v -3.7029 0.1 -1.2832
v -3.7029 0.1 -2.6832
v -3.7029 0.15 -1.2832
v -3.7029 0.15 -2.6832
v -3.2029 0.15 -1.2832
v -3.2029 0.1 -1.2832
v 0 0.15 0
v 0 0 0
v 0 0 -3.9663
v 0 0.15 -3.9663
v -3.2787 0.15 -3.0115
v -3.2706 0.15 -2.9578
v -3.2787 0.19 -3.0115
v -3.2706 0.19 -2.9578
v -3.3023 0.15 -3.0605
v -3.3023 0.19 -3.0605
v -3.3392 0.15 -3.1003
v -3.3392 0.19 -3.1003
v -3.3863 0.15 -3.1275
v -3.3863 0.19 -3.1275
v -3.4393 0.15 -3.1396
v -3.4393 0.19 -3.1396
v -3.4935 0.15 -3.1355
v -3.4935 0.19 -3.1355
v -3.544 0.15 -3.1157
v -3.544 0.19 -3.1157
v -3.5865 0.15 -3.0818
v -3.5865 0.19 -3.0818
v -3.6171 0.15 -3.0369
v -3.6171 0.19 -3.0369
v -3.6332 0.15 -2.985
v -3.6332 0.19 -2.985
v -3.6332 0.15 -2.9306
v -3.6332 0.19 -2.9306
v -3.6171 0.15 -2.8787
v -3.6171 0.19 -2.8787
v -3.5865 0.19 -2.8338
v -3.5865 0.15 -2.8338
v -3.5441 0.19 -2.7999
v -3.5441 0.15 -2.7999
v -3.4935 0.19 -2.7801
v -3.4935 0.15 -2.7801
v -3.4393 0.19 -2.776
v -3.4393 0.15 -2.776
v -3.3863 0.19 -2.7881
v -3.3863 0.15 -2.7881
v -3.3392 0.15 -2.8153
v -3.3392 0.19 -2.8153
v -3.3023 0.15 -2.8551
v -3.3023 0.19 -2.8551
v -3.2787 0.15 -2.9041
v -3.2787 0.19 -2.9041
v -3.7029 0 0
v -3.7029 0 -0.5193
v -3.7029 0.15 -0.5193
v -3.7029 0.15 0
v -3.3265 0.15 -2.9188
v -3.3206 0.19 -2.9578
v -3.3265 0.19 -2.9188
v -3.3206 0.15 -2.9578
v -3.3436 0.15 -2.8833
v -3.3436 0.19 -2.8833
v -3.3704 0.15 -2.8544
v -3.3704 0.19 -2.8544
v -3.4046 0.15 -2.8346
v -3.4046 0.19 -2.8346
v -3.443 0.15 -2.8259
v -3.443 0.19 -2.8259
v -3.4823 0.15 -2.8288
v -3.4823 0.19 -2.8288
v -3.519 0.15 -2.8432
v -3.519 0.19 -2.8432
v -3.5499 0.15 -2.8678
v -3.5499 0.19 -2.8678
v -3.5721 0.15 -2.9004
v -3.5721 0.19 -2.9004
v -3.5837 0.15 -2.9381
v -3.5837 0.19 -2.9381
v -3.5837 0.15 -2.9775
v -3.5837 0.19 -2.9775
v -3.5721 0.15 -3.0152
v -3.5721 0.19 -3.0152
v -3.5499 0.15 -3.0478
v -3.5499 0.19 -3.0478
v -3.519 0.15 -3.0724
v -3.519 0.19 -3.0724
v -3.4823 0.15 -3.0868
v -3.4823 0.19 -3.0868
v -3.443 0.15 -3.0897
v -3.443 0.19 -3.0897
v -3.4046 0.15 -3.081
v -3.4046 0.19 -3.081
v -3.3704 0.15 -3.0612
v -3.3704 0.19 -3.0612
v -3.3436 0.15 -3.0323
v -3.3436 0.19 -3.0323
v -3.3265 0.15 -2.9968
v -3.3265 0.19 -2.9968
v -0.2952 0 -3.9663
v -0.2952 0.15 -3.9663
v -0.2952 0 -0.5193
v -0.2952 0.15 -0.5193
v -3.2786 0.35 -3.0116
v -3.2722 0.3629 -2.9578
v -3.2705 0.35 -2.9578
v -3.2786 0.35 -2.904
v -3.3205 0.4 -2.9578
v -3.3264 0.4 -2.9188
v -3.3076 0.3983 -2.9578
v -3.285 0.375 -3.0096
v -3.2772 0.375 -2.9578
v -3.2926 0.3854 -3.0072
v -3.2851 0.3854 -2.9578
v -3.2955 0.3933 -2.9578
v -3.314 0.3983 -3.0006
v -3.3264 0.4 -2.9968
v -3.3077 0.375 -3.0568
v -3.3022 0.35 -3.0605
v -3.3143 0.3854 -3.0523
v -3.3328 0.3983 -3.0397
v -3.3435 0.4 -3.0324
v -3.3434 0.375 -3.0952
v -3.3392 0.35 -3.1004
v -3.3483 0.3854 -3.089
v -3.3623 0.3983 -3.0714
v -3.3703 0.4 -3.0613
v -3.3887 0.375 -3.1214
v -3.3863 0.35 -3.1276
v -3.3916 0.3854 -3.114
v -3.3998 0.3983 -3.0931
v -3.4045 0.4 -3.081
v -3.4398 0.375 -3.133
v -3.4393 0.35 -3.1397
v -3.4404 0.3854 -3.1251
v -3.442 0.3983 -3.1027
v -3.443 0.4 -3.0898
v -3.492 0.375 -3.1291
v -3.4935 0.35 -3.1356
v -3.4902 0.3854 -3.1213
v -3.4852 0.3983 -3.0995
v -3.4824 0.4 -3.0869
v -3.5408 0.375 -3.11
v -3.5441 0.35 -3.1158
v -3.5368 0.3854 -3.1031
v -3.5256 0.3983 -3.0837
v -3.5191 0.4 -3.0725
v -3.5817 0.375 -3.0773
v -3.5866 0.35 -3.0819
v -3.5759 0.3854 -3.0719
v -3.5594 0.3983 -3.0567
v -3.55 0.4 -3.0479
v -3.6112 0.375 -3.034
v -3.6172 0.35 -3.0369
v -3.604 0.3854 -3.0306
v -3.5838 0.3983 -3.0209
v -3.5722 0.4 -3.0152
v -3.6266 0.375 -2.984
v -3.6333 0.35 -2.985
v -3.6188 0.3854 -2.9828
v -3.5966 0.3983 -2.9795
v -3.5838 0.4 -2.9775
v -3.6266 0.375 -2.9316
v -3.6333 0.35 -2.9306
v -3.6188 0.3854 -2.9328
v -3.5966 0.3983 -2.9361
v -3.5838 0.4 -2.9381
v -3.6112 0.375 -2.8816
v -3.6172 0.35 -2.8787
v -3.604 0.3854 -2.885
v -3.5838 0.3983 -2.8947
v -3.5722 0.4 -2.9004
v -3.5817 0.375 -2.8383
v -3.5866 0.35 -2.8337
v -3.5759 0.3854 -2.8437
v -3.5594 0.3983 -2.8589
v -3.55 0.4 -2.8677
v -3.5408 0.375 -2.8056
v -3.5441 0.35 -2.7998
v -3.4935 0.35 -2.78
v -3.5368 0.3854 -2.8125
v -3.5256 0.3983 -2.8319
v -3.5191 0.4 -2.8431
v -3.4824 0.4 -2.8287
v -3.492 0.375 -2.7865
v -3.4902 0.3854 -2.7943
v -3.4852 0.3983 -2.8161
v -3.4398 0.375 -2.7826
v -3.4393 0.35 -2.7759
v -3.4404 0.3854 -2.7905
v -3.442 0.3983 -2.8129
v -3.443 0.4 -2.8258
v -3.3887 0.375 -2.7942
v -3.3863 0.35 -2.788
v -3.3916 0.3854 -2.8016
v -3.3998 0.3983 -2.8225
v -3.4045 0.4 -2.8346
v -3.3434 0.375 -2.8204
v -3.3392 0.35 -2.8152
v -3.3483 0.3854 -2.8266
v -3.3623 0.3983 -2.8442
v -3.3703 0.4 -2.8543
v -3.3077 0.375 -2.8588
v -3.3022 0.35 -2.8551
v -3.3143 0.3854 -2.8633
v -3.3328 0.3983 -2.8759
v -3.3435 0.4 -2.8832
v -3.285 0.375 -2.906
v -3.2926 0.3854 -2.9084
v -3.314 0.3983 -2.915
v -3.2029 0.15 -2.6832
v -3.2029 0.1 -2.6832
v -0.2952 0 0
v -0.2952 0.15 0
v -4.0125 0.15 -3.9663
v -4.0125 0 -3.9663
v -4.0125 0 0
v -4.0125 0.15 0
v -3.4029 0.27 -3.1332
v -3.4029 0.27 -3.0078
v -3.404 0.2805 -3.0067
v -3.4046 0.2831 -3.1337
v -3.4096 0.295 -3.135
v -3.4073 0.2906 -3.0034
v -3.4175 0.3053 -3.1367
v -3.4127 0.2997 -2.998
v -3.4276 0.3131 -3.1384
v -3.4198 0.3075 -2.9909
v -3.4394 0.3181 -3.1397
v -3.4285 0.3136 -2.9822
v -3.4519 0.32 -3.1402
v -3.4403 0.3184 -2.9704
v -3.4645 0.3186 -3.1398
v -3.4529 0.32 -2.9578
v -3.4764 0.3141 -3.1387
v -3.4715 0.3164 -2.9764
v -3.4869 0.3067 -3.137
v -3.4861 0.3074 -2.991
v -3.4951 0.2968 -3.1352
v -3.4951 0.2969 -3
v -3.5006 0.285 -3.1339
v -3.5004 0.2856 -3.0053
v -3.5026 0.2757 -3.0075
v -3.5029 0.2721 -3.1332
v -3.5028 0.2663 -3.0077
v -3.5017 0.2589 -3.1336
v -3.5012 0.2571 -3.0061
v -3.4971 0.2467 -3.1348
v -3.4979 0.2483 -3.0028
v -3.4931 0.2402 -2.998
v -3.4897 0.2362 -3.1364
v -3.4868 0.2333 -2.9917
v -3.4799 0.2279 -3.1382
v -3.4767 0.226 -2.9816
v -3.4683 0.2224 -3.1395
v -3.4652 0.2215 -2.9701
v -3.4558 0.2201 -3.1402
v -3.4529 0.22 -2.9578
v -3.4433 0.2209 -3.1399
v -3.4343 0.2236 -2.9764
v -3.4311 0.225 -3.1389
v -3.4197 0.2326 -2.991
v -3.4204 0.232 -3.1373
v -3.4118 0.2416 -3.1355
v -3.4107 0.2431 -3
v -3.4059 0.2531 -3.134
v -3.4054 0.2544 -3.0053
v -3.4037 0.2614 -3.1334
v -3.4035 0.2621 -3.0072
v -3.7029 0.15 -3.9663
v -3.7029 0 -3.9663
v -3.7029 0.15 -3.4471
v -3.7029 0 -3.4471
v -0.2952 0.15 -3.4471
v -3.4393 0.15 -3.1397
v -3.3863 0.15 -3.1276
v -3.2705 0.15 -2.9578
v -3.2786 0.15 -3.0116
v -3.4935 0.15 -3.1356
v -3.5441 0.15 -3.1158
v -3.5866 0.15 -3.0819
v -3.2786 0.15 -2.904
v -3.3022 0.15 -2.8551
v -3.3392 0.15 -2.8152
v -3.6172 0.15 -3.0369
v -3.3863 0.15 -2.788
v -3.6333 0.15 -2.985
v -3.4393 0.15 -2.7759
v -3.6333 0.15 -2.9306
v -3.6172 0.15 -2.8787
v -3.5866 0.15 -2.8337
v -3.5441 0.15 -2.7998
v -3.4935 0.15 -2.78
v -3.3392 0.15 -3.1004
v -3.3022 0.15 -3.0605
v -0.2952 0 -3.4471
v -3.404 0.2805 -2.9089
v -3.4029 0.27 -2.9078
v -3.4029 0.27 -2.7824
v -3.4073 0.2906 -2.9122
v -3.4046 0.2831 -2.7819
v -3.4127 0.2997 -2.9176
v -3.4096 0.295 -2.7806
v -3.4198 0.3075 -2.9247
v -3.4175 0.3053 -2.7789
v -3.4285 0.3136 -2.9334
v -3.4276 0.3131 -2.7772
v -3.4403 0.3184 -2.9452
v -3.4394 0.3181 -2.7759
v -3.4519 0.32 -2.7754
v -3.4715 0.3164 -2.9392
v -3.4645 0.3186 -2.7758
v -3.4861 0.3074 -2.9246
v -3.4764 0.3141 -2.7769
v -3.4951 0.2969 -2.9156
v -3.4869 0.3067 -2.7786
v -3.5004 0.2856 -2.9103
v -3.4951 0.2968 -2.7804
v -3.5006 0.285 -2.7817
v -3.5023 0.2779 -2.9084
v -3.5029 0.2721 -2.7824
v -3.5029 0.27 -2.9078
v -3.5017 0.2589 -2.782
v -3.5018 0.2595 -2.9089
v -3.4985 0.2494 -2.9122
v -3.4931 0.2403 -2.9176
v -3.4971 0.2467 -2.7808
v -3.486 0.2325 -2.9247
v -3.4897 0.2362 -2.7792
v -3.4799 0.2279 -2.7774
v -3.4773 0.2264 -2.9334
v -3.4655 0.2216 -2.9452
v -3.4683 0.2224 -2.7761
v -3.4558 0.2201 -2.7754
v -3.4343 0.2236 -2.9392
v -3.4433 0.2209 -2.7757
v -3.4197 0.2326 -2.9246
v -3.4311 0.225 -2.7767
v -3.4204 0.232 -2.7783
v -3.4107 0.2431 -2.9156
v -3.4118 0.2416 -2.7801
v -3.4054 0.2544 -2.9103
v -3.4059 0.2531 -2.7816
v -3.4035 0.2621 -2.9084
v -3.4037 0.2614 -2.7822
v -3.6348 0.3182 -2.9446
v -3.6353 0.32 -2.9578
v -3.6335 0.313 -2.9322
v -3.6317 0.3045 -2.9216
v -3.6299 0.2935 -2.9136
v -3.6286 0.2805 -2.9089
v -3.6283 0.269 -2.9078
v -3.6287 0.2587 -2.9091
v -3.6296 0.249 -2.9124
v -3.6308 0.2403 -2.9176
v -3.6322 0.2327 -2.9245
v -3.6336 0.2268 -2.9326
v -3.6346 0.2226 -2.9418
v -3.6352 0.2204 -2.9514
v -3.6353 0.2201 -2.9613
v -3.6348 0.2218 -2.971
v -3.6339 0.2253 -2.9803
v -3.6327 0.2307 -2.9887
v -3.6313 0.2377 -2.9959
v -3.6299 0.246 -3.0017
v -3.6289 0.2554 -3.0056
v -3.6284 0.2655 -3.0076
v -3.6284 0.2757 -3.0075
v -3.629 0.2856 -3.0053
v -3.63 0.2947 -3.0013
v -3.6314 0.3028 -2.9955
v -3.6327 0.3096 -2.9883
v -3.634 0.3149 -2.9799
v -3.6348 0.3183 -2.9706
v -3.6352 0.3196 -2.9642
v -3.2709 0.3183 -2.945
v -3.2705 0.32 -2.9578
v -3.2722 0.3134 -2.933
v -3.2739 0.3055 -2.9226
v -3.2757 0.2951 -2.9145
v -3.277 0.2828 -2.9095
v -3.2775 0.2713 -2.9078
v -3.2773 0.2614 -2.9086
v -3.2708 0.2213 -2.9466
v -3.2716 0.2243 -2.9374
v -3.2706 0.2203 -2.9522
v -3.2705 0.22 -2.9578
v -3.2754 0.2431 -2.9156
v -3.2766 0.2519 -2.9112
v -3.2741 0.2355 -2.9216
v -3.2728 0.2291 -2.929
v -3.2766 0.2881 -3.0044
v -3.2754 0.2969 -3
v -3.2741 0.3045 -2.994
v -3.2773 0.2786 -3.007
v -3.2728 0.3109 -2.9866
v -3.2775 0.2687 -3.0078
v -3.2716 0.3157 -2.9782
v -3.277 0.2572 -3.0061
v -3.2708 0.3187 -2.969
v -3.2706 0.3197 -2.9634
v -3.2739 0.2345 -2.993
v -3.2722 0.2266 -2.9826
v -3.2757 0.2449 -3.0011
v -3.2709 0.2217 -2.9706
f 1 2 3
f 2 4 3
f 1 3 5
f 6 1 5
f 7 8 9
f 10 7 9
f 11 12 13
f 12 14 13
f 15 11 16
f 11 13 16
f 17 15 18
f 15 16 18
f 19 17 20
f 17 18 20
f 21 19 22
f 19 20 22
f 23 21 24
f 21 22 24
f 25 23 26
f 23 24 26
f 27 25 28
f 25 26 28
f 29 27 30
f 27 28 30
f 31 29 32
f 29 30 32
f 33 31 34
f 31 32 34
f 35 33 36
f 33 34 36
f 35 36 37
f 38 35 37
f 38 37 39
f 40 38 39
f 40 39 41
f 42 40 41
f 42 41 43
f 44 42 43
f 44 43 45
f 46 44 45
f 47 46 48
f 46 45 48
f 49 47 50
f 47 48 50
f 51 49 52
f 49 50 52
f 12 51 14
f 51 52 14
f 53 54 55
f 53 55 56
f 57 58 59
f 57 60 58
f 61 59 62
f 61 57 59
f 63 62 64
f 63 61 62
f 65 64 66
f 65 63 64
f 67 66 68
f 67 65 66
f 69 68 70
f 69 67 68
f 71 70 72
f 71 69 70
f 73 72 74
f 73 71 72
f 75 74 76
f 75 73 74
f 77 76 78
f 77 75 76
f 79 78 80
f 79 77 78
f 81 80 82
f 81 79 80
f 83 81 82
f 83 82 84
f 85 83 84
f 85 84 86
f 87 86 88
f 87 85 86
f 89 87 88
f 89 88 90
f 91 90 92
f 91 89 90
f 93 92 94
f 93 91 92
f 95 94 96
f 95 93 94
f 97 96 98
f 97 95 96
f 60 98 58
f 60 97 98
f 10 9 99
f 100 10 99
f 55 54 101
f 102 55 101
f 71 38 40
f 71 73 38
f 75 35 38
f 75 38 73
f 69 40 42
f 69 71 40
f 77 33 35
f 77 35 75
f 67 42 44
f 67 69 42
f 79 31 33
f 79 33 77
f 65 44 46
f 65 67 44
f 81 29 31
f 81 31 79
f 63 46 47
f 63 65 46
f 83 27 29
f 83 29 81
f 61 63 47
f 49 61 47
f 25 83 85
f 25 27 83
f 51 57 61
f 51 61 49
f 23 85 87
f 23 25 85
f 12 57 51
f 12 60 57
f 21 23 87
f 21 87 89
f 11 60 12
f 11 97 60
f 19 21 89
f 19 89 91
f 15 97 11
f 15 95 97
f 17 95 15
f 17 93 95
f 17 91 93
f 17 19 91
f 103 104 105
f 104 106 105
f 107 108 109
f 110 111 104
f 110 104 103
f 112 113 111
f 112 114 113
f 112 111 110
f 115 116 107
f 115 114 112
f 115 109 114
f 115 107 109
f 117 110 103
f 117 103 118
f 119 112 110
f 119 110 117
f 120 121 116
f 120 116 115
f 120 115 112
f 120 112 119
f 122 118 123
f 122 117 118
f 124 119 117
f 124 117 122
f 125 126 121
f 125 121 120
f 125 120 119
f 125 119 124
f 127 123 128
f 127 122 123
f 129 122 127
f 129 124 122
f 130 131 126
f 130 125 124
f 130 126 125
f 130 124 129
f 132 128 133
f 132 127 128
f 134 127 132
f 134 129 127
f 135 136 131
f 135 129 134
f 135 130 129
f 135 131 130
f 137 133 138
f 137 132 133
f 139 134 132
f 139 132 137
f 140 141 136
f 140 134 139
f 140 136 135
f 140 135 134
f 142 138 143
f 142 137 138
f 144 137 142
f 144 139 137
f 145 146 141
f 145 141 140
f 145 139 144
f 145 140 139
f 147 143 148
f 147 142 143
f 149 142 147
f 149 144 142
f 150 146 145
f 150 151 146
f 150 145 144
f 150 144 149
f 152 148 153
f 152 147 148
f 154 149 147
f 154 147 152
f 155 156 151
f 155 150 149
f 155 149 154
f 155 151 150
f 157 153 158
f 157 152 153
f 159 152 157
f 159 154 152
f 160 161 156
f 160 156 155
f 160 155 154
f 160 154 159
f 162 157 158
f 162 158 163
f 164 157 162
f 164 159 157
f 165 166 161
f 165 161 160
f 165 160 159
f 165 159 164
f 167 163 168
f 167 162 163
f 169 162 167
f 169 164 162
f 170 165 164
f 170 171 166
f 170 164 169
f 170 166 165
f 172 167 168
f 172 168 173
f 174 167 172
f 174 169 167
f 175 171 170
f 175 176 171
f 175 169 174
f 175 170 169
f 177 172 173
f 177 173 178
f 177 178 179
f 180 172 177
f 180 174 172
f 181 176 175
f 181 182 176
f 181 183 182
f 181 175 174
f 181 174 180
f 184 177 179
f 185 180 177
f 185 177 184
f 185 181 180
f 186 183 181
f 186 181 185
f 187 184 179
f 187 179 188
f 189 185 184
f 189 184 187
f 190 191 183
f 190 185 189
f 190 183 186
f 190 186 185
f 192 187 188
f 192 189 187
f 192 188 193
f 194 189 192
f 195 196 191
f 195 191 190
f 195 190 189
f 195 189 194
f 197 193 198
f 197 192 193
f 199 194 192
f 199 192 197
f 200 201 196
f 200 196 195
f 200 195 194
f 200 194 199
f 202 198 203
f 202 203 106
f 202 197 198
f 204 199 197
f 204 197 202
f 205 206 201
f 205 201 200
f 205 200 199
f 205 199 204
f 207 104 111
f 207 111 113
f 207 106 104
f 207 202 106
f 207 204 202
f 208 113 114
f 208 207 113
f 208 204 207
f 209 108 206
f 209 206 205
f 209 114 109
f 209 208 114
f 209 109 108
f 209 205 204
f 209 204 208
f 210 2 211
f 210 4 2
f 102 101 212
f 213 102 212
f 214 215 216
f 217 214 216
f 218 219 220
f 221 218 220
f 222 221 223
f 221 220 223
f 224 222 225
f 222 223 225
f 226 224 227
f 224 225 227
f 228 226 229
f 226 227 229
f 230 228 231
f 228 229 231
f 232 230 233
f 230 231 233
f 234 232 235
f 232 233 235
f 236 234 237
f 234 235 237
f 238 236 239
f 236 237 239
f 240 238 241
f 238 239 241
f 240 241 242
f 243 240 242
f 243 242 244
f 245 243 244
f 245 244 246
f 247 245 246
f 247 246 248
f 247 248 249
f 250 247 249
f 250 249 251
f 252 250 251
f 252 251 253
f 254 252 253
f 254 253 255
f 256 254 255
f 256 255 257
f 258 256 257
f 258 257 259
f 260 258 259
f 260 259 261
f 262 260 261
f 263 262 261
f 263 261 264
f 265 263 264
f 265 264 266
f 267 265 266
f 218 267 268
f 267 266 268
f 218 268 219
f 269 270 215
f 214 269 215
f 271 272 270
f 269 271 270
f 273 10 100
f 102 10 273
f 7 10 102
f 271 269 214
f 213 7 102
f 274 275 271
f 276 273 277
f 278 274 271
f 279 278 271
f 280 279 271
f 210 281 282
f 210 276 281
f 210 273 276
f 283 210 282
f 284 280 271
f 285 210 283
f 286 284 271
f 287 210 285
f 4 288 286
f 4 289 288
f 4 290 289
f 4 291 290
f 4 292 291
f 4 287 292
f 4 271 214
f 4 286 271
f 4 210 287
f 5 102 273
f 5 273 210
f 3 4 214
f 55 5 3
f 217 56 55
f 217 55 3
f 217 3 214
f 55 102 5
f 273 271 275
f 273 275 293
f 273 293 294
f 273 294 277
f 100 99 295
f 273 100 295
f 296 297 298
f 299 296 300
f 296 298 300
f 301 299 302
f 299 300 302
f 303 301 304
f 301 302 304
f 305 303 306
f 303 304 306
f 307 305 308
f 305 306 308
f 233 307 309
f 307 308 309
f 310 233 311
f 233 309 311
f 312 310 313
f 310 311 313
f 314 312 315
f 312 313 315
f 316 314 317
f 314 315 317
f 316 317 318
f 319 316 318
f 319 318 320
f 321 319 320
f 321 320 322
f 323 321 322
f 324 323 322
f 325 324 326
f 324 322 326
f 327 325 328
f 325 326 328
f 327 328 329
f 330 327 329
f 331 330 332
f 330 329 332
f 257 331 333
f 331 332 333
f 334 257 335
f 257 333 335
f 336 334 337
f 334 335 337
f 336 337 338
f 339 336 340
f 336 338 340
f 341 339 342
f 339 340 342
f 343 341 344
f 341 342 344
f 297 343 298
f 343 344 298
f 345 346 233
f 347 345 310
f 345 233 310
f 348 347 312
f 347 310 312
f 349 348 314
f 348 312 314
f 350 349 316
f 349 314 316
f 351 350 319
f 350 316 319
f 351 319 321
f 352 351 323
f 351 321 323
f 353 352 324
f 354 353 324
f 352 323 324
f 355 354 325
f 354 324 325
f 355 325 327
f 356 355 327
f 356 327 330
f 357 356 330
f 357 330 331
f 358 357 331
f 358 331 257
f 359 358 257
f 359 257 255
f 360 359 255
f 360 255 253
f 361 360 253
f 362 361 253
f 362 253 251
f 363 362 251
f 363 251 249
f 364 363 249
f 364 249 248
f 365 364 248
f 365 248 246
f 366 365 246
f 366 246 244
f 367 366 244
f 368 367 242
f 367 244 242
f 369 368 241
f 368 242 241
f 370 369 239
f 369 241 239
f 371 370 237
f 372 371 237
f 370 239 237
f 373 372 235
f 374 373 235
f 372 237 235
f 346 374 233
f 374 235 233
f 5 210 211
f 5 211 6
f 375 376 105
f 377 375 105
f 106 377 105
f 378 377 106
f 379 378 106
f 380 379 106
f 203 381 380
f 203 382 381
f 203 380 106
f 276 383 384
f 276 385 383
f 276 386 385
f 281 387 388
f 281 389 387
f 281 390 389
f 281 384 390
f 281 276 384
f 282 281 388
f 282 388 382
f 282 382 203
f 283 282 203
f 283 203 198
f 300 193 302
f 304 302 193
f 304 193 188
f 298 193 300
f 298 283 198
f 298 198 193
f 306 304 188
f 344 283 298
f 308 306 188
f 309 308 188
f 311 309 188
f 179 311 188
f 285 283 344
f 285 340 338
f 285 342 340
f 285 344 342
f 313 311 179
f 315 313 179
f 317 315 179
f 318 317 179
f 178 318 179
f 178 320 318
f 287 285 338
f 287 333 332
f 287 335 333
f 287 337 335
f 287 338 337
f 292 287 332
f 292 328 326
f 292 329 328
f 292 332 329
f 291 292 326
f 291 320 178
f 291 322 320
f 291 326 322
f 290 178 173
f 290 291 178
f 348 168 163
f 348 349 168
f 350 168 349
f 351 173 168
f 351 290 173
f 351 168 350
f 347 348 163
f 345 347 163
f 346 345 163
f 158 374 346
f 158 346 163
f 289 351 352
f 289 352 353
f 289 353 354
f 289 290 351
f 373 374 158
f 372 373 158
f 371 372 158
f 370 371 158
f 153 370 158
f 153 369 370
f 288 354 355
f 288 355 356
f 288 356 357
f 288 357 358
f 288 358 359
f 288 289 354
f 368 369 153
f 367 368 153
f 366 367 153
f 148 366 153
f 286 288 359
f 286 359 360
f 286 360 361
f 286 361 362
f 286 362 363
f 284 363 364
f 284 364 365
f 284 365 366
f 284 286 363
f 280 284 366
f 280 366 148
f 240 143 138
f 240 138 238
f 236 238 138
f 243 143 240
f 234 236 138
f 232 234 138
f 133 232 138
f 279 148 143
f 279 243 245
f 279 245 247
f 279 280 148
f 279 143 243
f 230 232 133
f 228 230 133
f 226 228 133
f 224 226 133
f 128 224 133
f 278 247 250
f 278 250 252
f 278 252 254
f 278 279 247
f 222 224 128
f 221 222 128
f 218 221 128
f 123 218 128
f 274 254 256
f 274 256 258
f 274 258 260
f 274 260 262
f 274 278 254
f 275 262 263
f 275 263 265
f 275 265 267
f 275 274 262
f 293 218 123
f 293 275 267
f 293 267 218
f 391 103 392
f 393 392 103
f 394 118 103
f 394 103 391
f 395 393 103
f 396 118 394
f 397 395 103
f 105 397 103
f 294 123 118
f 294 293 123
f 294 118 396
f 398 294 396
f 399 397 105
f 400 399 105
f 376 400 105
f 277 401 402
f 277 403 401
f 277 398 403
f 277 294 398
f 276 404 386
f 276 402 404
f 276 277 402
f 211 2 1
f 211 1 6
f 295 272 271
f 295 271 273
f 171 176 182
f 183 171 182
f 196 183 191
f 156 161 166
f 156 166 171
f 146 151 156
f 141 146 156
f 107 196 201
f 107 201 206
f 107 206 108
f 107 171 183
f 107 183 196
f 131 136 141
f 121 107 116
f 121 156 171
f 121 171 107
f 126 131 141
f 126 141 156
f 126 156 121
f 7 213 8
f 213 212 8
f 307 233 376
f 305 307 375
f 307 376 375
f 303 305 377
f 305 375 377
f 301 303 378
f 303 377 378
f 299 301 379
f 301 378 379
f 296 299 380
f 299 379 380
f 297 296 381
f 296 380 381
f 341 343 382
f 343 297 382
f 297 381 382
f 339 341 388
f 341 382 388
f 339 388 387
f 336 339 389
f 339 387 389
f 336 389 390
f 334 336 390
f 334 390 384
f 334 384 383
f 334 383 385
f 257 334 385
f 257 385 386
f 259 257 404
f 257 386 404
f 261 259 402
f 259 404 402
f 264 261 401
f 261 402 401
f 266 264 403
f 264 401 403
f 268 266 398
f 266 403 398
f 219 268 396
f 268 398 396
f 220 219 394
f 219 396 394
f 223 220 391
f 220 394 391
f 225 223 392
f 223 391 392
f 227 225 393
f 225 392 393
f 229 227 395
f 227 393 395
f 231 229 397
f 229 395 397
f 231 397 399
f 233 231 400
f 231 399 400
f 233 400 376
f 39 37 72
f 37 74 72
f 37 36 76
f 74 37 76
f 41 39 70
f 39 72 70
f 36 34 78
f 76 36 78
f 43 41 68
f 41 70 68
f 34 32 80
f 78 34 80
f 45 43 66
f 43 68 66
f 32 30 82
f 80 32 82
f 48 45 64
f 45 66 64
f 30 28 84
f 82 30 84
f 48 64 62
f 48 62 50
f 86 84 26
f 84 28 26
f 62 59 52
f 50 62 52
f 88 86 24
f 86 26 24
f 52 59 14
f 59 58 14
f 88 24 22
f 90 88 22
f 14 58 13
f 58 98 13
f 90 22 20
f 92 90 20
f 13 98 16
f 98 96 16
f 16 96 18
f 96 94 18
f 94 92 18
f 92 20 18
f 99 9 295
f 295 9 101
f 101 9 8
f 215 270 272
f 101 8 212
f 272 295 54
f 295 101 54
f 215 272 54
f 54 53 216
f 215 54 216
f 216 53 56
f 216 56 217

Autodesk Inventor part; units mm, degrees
ref_plane "YZ Plane" through (0, 0, 0) normal (1, 0, 0) x (0, 1, 0)
ref_plane "XZ Plane" through (0, 0, 0) normal (0, 1, 0) x (-1, 0, 0)
sketch "Boceto1" plane through (0, 0, 0) normal (0, 1, 0) x (-1, 0, 0)
  line L0 (3.7029, -0.5193) -> (0.2952, -0.5193)
  line L1 (3.7029, -3.4471) -> (0.2952, -3.4471)
  line L2 (3.7029, -0.5193) -> (3.7029, 0)
  line L3 (3.7029, 0) -> (5.1802, 0)
  line L4 (3.7029, -3.4471) -> (3.7029, -3.9663)
  line L5 (3.7029, -3.9663) -> (5.1802, -3.9663)
  line L6 (4.0125, -3.9663) -> (4.0125, 0)
  line L7 (5.1802, -3.9663) -> (5.1802, 0)
  line L8 (0.2952, -0.5193) -> (0.2952, 0)
  line L9 (0.2952, 0) -> (0, 0)
  line L10 (0, 0) -> (-1.1677, 0)
  line L11 (-1.1677, 0) -> (-1.1677, -3.9663)
  line L12 (-1.1677, -3.9663) -> (0, -3.9663)
  line L13 (0, -3.9663) -> (0.2952, -3.9663)
  line L14 (0.2952, -3.9663) -> (0.2952, -3.4471)
  line L15 (0, 0) -> (0, -3.9663)
  line L16 (3.7029, -2.6832) -> (3.7029, -1.2832)
  line L17 (3.7029, -2.6832) -> (3.2029, -2.6832)
  line L18 (3.2029, -2.6832) -> (3.2029, -1.2832)
  line L19 (3.7029, -1.2832) -> (3.2029, -1.2832)
  line L20 (3.3553, -1.6053) -> (3.5807, -1.6053)
  line L21 (3.5807, -1.6053) -> (3.5807, -2.361)
  line L22 (3.5807, -2.361) -> (3.3553, -2.361)
  line L23 (3.3553, -2.361) -> (3.3553, -1.6053)
  circle A0 centre (3.4529, -2.9578) radius 0.1824
  line L24 (0.2952, -3.9663) -> (3.7029, -3.9663)
  line L25 (0.2952, 0) -> (3.7029, 0)
  point P0 (0, 0)
extrude "Extrusión1" add sketch "Boceto1" along normal blind 0.15 contours L2 L3 L6 L5 L4 L1 L14 L13 L15 L9 L8 L0 | L17 L18 L19 L16 | L20 L21 L22 L23 | A0
sketch "Boceto2" plane through (0, 0.15, 0) normal (0, 1, 0) x (1, 0, 0)
  line L0 (-3.7029, 0.5193) -> (-0.2952, 0.5193)
  line L1 (-3.7029, 3.4471) -> (-0.2952, 3.4471)
  line L2 (-3.7029, 0.5193) -> (-3.7029, 0)
  line L3 (-3.7029, 0) -> (-5.1802, 0)
  line L4 (-3.7029, 3.4471) -> (-3.7029, 3.9663)
  line L5 (-3.7029, 3.9663) -> (-5.1802, 3.9663)
  line L6 (-4.0125, 3.9663) -> (-4.0125, 0)
  line L7 (-5.1802, 3.9663) -> (-5.1802, 0)
  line L8 (-0.2952, 0.5193) -> (-0.2952, 0)
  line L9 (-0.2952, 0) -> (0, 0)
  line L10 (0, 0) -> (1.1677, 0)
  line L11 (1.1677, 0) -> (1.1677, 3.9663)
  line L12 (1.1677, 3.9663) -> (0, 3.9663)
  line L13 (0, 3.9663) -> (-0.2952, 3.9663)
  line L14 (-0.2952, 3.9663) -> (-0.2952, 3.4471)
  line L15 (0, 0) -> (0, 3.9663)
  line L16 (-3.7029, 2.6832) -> (-3.7029, 1.2832)
  line L17 (-3.7029, 2.6832) -> (-3.2029, 2.6832)
  line L18 (-3.2029, 2.6832) -> (-3.2029, 1.2832)
  line L19 (-3.7029, 1.2832) -> (-3.2029, 1.2832)
  line L20 (-3.3553, 1.6053) -> (-3.5807, 1.6053)
  line L21 (-3.5807, 1.6053) -> (-3.5807, 2.361)
  line L22 (-3.5807, 2.361) -> (-3.3553, 2.361)
  line L23 (-3.3553, 2.361) -> (-3.3553, 1.6053)
  circle A0 centre (-3.4529, 2.9578) radius 0.1824
  line L24 (-0.2952, 3.9663) -> (-3.7029, 3.9663)
  line L25 (-0.2952, 0) -> (-3.7029, 0)
  line L26 (-3.7029, 0.5193) -> (-0.2952, 0.5193) projected
  line L27 (-0.2952, 0.5193) -> (-0.2952, 0) projected
  line L28 (-0.2952, 0) -> (0, 0) projected
  line L29 (0, 0) -> (0, 3.9663) projected
  line L30 (0, 3.9663) -> (-0.2952, 3.9663) projected
  line L31 (-0.2952, 3.9663) -> (-0.2952, 3.4471) projected
  line L32 (-0.2952, 3.4471) -> (-3.7029, 3.4471) projected
  line L33 (-3.7029, 3.4471) -> (-3.7029, 3.9663) projected
  line L34 (-3.7029, 3.9663) -> (-4.0125, 3.9663) projected
  line L35 (-4.0125, 3.9663) -> (-4.0125, 0) projected
  line L36 (-4.0125, 0) -> (-3.7029, 0) projected
  line L37 (-3.7029, 0) -> (-3.7029, 0.5193) projected
  point P0 (0, 0)
extrude "Extrusión2" cut sketch "Boceto2" against normal blind 0.05 contours L17 L18 L19 L16 | L20 L21 L22 L23
sketch "Boceto3" plane through (0, 0.15, 0) normal (0, 1, 0) x (1, 0, 0)
  line L0 (-3.7029, 0.5193) -> (-0.2952, 0.5193)
  line L1 (-3.7029, 3.4471) -> (-0.2952, 3.4471)
  line L2 (-3.7029, 0.5193) -> (-3.7029, 0)
  line L3 (-3.7029, 0) -> (-5.1802, 0)
  line L4 (-3.7029, 3.4471) -> (-3.7029, 3.9663)
  line L5 (-3.7029, 3.9663) -> (-5.1802, 3.9663)
  line L6 (-4.0125, 3.9663) -> (-4.0125, 0)
  line L7 (-5.1802, 3.9663) -> (-5.1802, 0)
  line L8 (-0.2952, 0.5193) -> (-0.2952, 0)
  line L9 (-0.2952, 0) -> (0, 0)
  line L10 (0, 0) -> (1.1677, 0)
  line L11 (1.1677, 0) -> (1.1677, 3.9663)
  line L12 (1.1677, 3.9663) -> (0, 3.9663)
  line L13 (0, 3.9663) -> (-0.2952, 3.9663)
  line L14 (-0.2952, 3.9663) -> (-0.2952, 3.4471)
  line L15 (0, 0) -> (0, 3.9663)
  line L16 (-3.7029, 2.6832) -> (-3.7029, 1.2832)
  line L17 (-3.7029, 2.6832) -> (-3.2029, 2.6832)
  line L18 (-3.2029, 2.6832) -> (-3.2029, 1.2832)
  line L19 (-3.7029, 1.2832) -> (-3.2029, 1.2832)
  line L20 (-3.3553, 1.6053) -> (-3.5807, 1.6053)
  line L21 (-3.5807, 1.6053) -> (-3.5807, 2.361)
  line L22 (-3.5807, 2.361) -> (-3.3553, 2.361)
  line L23 (-3.3553, 2.361) -> (-3.3553, 1.6053)
  circle A0 centre (-3.4529, 2.9578) radius 0.1824
  line L24 (-0.2952, 3.9663) -> (-3.7029, 3.9663)
  line L25 (-0.2952, 0) -> (-3.7029, 0)
  line L26 (-3.2029, 1.2832) -> (-3.7029, 1.2832) projected
  line L27 (-3.7029, 1.2832) -> (-3.7029, 2.6832) projected
  line L28 (-3.7029, 2.6832) -> (-3.2029, 2.6832) projected
  line L29 (-3.2029, 2.6832) -> (-3.2029, 1.2832) projected
  line L30 (-3.7029, 0.5193) -> (-0.2952, 0.5193) projected
  line L31 (-0.2952, 0.5193) -> (-0.2952, 0) projected
  line L32 (-0.2952, 0) -> (0, 0) projected
  line L33 (0, 0) -> (0, 3.9663) projected
  line L34 (0, 3.9663) -> (-0.2952, 3.9663) projected
  line L35 (-0.2952, 3.9663) -> (-0.2952, 3.4471) projected
  line L36 (-0.2952, 3.4471) -> (-3.7029, 3.4471) projected
  line L37 (-3.7029, 3.4471) -> (-3.7029, 3.9663) projected
  line L38 (-3.7029, 3.9663) -> (-4.0125, 3.9663) projected
  line L39 (-4.0125, 3.9663) -> (-4.0125, 0) projected
  line L40 (-4.0125, 0) -> (-3.7029, 0) projected
  line L41 (-3.7029, 0) -> (-3.7029, 0.5193) projected
  point P0 (0, 0)
extrude "Extrusión3" add sketch "Boceto3" along normal blind 0.25 contours A0
fillet "Empalme1" radius 0.05 1 edges at (-3.6353, 0.4, -2.9578)
ref_plane "Plano de trabajo1" through (0, 0, -2.9578) normal (0, 0, 1) x (1, 0, 0)
sketch "Boceto4" plane through (0, 0, -2.9578) normal (0, 0, 1) x (1, 0, 0)
  line L0 (-3.6353, 0.15) -> (-3.2706, 0.15) projected
  line L1 (-3.2706, 0.35) -> (-3.6353, 0.35) projected
  line L2 (-3.2706, 0.15) -> (-3.2706, 0.17)
  line L3 (-3.2706, 0.15) -> (-3.2706, 0.35) projected
  line L4 (-3.3206, 0.17) -> (-3.3206, 0.15)
  line L5 (-3.6353, 0.15) -> (-3.2706, 0.15) projected
  line L6 (-3.2706, 0.15) -> (-3.3206, 0.15)
  line L7 (-3.4529, 0.35) -> (-3.4529, 0.5679)
  line L8 (-3.3206, 0.17) -> (-3.3206, 0.19)
  line L9 (-3.3206, 0.19) -> (-3.2706, 0.19)
  line L10 (-3.2706, 0.19) -> (-3.2706, 0.15)
  point P0 (0, 0)
  dimension "d9" = 0.05
  dimension "d10" = 0.02
revolve "Revolución1" cut sketch "Boceto4" angle 360 about axis through (-3.4529, 0.35, -2.9578) along (0, 1, 0)
ref_plane "Plano de trabajo2" through (0, 0, -2.5578) normal (0, 0, 1) x (1, 0, 0)
sketch "Boceto5" plane through (0, 0, -2.5578) normal (0, 0, 1) x (1, 0, 0)
  line L0 (-3.2706, 0.19) -> (-3.6353, 0.19) projected
  line L1 (-3.2706, 0.35) -> (-3.6353, 0.35) projected
  line L2 (-3.6353, 0.19) -> (-3.6353, 0.35) projected
  line L3 (-3.2706, 0.35) -> (-3.6353, 0.35) projected
  line L4 (-3.3206, 0.19) -> (-3.5853, 0.19) projected
  line L5 (-3.2706, 0.19) -> (-3.2706, 0.35) projected
  circle A0 centre (-3.4529, 0.27) radius 0.05
  point P0 (0, 0)
  dimension "d13" = 0.1
extrude "Extrusión4" cut sketch "Boceto5" against normal blind 25 contours A0
sketch "Boceto6" plane through (0, 0, 0) normal (1, 0, 0) x (0, 1, 0)
  line L0 (0.35, -3.1402) -> (0.35, -2.7755) projected
  line L1 (0.19, -2.7755) -> (0.35, -2.7755) projected
  line L2 (0.19, -3.0902) -> (0.19, -2.8254) projected
  circle A0 centre (0.27, -2.9578) radius 0.05
  point P0 (0, 0)
  dimension "d16" = 0.1
extrude "Extrusión5" cut sketch "Boceto6" against normal blind 25
properties part number "ET13"
